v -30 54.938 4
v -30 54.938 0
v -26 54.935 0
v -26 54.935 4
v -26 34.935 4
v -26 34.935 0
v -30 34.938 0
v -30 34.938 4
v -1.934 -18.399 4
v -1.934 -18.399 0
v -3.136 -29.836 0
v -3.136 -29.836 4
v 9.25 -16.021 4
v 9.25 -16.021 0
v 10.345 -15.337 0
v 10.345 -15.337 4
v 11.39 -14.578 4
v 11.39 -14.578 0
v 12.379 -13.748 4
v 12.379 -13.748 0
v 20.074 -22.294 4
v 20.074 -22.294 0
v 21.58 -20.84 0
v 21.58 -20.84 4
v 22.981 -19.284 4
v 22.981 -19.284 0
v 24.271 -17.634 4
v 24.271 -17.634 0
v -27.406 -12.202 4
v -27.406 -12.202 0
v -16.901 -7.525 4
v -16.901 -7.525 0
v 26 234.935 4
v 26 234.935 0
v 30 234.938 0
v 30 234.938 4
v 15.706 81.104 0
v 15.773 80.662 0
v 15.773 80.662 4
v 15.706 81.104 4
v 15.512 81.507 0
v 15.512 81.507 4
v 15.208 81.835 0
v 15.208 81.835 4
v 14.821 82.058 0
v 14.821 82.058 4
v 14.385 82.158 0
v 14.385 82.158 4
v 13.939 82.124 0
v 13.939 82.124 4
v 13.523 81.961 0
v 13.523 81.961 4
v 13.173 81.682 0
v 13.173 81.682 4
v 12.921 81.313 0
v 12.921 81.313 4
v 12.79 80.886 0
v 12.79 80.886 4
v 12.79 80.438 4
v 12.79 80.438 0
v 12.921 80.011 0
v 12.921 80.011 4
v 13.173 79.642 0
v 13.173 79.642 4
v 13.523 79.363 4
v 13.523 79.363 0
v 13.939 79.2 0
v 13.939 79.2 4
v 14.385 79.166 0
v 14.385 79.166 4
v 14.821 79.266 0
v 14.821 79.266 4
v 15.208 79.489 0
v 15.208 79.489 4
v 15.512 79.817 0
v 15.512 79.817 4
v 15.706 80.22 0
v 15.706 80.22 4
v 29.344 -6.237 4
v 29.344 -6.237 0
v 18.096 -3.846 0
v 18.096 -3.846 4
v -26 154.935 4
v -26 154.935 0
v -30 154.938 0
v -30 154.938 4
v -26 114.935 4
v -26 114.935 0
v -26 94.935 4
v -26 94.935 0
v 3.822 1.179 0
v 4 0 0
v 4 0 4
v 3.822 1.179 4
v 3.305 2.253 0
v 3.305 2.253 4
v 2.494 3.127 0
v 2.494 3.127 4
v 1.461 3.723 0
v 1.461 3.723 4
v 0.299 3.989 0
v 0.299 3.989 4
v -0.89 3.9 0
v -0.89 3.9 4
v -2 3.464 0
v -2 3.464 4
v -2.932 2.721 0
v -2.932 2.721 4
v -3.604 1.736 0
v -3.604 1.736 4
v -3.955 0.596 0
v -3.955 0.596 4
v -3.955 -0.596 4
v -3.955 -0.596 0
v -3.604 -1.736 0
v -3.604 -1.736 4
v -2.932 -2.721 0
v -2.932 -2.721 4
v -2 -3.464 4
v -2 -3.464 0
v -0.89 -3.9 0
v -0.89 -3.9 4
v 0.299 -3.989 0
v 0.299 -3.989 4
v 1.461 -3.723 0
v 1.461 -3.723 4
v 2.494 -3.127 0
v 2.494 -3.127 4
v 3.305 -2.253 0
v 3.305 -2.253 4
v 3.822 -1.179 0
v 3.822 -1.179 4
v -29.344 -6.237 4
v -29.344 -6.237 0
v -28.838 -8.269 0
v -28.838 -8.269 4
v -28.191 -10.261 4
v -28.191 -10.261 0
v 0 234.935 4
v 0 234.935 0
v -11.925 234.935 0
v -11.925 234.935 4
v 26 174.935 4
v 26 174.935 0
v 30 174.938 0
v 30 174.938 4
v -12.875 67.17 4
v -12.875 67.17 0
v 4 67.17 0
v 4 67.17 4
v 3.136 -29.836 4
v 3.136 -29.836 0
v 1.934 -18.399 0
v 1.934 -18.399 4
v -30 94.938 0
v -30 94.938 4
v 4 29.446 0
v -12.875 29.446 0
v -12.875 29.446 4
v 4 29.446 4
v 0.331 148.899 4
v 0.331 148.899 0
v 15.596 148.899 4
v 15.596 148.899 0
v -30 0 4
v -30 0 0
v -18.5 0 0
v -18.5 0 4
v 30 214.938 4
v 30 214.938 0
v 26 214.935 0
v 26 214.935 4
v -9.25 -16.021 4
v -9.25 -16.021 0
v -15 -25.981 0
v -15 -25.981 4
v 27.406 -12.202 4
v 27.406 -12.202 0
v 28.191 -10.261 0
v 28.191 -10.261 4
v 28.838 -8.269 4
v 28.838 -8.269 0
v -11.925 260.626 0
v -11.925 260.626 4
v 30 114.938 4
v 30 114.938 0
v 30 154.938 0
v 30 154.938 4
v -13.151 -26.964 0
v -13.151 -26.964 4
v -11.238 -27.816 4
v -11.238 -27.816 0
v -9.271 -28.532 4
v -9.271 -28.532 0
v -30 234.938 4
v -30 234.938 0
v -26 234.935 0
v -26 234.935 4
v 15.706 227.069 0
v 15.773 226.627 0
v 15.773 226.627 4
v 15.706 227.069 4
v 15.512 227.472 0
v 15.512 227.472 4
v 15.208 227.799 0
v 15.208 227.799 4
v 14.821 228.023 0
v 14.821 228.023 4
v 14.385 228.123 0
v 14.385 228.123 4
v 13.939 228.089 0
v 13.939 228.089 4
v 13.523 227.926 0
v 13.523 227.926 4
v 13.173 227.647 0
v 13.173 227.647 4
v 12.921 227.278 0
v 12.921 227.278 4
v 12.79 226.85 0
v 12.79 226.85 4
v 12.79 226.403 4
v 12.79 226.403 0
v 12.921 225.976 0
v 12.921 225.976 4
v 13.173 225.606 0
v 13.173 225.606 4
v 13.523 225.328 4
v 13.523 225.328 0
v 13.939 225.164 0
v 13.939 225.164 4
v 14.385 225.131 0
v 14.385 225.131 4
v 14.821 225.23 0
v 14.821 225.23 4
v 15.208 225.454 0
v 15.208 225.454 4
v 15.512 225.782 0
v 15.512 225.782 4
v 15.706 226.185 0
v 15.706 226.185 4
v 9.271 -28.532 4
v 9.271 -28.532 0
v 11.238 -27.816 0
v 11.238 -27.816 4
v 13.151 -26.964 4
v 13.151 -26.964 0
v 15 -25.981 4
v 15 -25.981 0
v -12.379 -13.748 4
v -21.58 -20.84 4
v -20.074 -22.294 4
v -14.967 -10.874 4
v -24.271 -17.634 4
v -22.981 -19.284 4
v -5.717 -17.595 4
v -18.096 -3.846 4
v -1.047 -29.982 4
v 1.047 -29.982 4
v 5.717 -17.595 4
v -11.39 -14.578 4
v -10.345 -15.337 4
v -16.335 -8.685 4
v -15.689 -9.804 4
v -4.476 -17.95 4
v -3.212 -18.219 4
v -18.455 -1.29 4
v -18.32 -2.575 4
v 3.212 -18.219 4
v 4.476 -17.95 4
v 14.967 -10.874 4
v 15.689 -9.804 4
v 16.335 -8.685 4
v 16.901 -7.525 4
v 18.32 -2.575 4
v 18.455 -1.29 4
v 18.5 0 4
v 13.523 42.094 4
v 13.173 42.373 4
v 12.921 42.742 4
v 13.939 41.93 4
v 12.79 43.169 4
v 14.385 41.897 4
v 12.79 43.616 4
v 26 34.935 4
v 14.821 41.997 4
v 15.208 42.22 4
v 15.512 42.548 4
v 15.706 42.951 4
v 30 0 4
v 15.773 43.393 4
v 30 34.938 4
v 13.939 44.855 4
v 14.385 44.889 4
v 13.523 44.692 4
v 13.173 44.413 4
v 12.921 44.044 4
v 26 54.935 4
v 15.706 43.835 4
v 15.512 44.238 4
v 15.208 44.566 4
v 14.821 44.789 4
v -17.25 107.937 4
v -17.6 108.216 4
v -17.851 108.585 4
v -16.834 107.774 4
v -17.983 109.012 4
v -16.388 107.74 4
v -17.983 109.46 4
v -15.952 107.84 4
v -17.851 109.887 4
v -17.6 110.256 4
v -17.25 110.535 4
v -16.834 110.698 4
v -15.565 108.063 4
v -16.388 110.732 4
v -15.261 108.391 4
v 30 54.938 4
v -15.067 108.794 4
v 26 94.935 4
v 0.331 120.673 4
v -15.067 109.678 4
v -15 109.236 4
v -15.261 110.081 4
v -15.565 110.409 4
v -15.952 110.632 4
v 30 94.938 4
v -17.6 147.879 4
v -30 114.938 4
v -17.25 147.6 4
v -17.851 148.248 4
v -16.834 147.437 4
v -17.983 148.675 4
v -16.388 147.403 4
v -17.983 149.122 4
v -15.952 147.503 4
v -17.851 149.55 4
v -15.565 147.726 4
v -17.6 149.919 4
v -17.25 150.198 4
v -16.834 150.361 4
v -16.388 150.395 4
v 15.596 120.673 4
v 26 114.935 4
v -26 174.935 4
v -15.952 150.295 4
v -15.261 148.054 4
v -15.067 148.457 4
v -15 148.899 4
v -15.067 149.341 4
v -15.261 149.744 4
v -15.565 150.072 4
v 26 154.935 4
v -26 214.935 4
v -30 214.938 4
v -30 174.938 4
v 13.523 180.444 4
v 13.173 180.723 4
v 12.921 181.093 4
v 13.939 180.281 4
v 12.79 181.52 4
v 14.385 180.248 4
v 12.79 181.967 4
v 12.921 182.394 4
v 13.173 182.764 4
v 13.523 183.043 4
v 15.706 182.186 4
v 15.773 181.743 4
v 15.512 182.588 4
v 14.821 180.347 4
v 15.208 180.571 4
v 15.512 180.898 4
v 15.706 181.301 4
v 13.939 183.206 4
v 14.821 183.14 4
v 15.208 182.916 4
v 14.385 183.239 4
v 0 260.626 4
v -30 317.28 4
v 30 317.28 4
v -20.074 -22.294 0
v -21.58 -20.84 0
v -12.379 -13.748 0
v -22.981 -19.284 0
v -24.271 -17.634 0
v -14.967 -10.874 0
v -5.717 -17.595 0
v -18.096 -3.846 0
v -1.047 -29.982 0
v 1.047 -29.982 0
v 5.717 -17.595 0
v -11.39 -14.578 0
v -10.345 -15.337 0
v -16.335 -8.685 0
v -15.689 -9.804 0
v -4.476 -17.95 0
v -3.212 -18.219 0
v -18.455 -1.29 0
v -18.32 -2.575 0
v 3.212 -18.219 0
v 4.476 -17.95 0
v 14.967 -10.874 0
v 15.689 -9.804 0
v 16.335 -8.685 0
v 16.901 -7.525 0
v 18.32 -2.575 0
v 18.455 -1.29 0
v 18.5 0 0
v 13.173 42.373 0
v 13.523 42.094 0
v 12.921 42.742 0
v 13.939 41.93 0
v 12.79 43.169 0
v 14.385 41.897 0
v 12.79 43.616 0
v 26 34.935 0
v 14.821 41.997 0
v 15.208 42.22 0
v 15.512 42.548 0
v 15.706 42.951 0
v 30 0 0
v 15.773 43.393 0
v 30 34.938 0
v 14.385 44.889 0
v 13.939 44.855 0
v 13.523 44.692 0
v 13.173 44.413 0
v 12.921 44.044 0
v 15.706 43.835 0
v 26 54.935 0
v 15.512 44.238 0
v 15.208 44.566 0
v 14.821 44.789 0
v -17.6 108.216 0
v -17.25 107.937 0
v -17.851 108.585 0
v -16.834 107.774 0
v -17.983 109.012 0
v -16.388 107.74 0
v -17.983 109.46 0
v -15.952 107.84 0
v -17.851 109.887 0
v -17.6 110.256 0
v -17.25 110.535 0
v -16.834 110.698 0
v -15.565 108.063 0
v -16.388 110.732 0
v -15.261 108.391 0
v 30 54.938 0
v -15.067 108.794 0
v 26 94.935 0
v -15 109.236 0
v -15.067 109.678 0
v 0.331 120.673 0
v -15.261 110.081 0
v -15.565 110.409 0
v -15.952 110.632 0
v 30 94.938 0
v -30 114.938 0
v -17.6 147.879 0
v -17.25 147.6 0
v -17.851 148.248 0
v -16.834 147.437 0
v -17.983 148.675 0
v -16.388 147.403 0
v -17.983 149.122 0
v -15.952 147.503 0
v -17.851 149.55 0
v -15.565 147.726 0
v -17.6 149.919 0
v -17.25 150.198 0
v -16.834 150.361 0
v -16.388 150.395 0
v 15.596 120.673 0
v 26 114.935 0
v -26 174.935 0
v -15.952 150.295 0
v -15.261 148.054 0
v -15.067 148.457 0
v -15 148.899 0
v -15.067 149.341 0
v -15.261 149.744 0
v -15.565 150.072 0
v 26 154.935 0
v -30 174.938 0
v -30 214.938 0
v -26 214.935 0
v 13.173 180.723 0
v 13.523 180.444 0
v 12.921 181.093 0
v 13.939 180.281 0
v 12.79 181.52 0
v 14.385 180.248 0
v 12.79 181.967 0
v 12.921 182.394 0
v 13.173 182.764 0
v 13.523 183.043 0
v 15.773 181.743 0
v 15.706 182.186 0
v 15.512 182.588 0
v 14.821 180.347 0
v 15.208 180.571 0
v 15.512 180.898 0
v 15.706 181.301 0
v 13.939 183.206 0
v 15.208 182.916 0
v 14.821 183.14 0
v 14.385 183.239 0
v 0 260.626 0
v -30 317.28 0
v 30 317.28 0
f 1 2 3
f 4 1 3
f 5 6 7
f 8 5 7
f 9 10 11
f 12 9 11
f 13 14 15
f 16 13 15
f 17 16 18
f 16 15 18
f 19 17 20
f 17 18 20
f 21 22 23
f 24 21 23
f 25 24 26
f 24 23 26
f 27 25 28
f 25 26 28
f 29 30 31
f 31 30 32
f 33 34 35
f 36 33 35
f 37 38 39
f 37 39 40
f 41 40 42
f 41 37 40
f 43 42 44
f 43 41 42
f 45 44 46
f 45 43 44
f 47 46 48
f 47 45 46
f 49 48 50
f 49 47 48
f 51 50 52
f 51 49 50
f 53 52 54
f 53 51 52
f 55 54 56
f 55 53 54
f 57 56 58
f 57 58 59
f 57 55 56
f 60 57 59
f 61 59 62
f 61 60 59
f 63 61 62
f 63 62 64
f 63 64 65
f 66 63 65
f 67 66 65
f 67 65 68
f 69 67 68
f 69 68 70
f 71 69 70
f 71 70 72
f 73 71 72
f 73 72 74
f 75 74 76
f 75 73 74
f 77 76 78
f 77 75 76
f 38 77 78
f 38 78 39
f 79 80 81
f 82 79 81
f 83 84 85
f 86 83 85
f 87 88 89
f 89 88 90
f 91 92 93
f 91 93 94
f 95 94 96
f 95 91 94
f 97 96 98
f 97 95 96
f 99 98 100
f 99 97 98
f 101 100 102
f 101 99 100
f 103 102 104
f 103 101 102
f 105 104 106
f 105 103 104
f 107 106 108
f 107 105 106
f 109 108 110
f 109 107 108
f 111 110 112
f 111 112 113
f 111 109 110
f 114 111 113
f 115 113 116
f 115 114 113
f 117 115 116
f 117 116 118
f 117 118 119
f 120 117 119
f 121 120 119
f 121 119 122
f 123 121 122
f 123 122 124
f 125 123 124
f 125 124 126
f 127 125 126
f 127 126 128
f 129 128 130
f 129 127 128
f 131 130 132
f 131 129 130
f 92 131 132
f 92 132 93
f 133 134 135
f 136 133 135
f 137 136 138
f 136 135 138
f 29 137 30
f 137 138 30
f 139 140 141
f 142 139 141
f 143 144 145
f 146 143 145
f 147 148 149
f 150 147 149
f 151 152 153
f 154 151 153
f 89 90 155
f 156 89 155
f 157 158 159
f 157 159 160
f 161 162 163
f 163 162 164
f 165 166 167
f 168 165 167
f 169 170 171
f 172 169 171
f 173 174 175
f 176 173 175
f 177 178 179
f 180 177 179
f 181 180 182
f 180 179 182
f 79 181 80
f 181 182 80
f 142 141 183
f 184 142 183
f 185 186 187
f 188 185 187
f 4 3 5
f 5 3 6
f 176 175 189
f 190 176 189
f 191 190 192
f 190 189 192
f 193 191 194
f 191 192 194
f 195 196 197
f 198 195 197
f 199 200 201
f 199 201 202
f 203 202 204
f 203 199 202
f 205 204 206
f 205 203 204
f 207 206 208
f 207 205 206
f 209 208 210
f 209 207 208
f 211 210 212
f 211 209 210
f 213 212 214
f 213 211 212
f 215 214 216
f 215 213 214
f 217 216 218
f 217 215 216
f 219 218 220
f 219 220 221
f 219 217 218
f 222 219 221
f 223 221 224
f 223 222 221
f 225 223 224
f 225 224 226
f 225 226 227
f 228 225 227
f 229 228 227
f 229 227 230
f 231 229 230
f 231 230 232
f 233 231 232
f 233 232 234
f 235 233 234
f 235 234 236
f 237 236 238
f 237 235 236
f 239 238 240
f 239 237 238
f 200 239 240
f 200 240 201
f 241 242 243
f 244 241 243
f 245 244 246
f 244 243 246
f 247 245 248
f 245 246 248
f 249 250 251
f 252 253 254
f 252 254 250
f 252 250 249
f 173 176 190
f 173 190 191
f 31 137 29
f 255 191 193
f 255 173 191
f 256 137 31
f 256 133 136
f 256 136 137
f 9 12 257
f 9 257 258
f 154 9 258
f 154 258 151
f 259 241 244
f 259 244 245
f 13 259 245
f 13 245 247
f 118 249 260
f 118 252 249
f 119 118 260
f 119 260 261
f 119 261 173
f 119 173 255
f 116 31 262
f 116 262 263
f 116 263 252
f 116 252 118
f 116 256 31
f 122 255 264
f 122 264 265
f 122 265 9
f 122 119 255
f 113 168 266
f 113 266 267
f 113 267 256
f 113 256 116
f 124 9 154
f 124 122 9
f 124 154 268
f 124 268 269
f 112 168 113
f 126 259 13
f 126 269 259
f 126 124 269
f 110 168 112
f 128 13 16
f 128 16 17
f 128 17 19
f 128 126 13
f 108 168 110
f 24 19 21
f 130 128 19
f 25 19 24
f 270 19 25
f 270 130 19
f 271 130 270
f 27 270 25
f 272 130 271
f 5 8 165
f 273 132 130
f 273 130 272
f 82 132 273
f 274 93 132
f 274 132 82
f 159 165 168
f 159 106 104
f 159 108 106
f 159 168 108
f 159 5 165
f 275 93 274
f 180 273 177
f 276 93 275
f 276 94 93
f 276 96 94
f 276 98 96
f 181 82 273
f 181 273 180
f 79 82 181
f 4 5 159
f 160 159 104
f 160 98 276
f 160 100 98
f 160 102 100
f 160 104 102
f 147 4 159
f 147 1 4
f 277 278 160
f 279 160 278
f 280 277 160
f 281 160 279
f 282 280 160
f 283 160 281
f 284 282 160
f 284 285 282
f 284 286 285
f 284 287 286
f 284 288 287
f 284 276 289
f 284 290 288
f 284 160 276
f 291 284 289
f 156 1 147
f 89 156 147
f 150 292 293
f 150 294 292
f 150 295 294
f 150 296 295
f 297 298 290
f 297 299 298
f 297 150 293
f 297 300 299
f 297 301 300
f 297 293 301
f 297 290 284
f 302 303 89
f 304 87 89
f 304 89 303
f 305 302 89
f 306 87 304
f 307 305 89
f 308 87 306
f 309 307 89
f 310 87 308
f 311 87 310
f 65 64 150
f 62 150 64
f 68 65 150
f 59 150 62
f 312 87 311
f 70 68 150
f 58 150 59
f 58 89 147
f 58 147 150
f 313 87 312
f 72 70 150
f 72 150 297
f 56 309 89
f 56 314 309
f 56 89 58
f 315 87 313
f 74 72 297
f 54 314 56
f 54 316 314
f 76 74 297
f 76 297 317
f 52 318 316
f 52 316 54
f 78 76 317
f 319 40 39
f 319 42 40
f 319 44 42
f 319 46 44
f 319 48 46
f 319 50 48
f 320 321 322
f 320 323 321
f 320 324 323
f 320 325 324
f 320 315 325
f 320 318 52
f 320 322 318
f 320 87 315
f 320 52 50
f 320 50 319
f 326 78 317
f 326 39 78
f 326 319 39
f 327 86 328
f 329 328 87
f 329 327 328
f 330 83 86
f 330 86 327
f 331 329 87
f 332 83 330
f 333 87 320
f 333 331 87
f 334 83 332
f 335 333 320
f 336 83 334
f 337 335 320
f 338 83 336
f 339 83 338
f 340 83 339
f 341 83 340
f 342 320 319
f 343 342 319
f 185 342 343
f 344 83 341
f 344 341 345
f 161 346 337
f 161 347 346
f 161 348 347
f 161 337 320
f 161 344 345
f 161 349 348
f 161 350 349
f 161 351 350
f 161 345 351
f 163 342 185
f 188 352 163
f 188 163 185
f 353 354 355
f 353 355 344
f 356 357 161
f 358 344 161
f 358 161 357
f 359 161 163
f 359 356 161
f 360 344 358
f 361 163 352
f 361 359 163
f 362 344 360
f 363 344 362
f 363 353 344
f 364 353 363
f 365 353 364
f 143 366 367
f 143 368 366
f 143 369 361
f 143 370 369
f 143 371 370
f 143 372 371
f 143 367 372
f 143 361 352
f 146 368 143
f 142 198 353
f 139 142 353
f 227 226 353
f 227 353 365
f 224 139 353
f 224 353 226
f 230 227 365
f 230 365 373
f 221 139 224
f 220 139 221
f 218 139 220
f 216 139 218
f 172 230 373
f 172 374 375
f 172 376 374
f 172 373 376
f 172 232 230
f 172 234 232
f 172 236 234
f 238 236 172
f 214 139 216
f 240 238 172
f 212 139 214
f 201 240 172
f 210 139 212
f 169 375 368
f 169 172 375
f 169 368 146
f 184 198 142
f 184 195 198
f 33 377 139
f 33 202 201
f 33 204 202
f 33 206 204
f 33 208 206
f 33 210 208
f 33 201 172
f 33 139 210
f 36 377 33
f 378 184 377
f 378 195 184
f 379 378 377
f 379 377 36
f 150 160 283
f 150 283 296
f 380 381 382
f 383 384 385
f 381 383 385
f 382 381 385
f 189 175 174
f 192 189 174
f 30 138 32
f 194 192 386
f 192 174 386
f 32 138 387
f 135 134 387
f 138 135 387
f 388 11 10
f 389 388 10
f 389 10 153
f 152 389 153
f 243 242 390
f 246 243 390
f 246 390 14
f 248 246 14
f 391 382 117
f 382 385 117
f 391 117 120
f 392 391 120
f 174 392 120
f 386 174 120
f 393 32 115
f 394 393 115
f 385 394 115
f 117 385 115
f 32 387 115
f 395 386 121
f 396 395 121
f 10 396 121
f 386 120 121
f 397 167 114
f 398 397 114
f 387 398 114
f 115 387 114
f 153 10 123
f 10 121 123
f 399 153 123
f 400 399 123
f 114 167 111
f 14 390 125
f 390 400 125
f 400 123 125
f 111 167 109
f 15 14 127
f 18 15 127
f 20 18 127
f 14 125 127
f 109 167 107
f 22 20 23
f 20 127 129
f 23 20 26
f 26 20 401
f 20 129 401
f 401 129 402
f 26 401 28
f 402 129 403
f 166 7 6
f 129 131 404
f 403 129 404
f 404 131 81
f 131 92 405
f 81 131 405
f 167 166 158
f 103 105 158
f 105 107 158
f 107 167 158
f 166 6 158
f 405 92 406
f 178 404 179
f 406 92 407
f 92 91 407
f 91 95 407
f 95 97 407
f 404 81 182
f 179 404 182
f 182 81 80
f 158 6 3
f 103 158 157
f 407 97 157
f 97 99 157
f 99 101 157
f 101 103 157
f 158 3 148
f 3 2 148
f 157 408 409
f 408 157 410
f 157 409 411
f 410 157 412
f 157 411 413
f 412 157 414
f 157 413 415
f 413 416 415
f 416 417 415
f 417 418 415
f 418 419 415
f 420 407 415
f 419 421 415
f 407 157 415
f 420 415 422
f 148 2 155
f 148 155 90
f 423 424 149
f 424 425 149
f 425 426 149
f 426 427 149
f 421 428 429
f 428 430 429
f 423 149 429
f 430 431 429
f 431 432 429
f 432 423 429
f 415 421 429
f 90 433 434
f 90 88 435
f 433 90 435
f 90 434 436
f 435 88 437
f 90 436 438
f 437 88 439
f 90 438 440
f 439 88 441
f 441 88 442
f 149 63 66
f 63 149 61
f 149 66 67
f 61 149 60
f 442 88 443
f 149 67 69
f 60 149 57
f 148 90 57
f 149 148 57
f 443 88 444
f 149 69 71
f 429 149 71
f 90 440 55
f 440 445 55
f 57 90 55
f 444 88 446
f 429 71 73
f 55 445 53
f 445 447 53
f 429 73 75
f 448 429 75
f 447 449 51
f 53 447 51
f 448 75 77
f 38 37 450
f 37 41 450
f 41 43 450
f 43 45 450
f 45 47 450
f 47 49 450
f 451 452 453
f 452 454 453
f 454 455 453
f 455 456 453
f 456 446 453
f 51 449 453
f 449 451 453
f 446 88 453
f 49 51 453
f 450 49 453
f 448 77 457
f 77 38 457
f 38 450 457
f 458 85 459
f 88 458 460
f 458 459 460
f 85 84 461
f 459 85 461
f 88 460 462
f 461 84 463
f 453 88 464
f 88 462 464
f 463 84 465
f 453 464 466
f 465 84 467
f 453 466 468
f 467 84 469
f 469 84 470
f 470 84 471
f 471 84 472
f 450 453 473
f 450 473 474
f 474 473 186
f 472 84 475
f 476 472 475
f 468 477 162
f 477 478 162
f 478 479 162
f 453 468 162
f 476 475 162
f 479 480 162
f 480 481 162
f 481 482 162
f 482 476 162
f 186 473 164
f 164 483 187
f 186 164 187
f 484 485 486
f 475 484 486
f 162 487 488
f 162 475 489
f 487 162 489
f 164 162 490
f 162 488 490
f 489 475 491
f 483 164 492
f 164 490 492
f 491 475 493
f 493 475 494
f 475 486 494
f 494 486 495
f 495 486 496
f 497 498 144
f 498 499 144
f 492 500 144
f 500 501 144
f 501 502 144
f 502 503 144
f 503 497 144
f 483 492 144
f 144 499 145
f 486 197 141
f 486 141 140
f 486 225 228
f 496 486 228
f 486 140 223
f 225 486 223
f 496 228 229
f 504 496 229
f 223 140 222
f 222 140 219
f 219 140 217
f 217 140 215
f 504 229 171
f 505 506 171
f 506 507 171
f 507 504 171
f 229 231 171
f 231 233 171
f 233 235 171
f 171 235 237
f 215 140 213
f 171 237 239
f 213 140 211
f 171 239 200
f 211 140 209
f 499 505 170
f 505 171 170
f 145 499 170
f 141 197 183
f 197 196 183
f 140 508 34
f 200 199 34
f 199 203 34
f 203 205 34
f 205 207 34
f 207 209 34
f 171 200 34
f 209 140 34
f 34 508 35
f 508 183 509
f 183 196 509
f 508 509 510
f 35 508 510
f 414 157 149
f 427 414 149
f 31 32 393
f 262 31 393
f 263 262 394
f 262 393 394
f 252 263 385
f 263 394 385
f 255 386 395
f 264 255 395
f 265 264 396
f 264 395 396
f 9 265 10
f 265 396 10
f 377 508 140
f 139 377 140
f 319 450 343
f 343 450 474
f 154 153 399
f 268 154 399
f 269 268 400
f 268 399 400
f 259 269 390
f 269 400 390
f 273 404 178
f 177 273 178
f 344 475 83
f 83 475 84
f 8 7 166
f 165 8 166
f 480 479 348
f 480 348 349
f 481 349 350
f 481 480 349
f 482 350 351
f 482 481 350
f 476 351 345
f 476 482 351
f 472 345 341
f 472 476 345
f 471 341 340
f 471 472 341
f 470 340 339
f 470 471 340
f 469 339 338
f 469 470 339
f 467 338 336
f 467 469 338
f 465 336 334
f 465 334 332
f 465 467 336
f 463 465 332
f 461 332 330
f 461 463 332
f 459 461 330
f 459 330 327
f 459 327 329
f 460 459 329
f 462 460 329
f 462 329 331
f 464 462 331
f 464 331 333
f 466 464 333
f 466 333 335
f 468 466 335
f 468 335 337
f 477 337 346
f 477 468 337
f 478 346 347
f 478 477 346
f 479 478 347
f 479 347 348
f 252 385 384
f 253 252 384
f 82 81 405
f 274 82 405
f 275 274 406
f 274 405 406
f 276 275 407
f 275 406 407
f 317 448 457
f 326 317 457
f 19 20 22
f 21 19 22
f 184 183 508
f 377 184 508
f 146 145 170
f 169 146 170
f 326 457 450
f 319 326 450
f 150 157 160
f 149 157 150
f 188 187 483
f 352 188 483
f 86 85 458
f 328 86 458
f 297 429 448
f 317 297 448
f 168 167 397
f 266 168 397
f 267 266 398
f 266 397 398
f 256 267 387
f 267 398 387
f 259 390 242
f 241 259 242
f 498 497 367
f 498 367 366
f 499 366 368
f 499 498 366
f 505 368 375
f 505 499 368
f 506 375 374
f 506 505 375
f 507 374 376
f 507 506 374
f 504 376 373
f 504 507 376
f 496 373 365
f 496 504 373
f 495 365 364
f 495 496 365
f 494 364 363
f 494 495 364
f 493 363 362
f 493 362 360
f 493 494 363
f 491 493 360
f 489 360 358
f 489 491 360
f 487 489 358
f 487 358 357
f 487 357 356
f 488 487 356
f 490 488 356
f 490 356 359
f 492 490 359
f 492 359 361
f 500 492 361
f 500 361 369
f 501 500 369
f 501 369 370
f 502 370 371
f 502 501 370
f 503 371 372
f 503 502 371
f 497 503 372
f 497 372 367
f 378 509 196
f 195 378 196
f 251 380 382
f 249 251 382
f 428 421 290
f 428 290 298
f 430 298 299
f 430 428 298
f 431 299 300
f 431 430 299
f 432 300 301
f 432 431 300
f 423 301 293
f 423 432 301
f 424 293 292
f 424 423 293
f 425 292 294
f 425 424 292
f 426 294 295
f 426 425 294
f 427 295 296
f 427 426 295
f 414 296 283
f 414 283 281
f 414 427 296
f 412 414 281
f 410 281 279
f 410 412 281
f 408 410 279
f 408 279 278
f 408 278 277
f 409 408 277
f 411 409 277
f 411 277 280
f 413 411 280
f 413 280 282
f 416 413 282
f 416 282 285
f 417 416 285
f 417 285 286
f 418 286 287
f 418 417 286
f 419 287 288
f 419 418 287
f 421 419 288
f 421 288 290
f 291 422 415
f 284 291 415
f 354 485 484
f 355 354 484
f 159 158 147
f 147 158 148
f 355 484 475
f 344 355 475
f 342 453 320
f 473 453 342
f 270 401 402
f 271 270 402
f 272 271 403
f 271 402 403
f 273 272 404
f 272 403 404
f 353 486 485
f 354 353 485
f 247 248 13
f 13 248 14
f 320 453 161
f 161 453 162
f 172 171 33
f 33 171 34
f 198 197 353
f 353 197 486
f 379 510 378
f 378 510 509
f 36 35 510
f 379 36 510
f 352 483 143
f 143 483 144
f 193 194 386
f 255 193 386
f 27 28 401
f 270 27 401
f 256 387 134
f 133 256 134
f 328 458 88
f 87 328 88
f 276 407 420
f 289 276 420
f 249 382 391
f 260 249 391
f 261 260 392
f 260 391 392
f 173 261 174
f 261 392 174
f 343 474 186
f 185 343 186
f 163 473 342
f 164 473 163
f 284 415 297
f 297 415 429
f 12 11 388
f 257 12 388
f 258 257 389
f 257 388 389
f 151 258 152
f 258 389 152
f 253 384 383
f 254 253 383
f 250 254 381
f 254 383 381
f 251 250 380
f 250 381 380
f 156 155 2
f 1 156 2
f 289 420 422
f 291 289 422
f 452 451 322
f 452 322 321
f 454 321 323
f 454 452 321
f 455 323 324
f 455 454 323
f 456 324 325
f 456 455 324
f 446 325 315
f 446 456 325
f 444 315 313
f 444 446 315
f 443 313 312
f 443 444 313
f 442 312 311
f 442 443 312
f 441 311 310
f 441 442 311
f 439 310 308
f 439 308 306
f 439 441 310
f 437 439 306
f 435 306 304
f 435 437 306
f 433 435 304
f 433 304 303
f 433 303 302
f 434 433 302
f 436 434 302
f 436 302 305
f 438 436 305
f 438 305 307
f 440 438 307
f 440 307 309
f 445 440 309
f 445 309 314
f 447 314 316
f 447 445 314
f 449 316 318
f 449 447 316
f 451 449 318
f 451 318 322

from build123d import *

# Parameters (mm, degrees)
SKETCH1_R           = 1.5
SKETCH1_R_2         = 4.000000004
SKETCH1_W           = 15.264959334
SKETCH1_H           = 28.225795916
SKETCH1_W_2         = 16.875415015
SKETCH1_H_2         = 37.724658957
BOSS_EXTRUDE1_DEPTH = 4


with BuildPart() as part:
    # Sketch1 → Boss-Extrude1 (new body)
    with BuildSketch(Plane.XY):
        with BuildLine():
            Line((-30.000000002, 34.937585276), (-30.000000002, -5e-09))
            Line((-30.000000002, -5e-09), (-18.500000007, -5e-09))
            ThreePointArc((-18.500000007, -5e-09), (-18.398655071, -1.933776576), (-18.09573062, -3.846366286))
            Line((-18.09573062, -3.846366286), (-29.344428024, -6.23735073))
            ThreePointArc((-29.344428024, -6.23735073), (-28.53169549, -9.270509837), (-27.406363731, -12.202099298))
            Line((-27.406363731, -12.202099298), (-16.900590972, -7.524627904))
            ThreePointArc((-16.900590972, -7.524627904), (-16.021469975, -9.250000008), (-14.966814401, -10.874027176))
            Line((-14.966814401, -10.874027176), (-24.270509832, -17.633557574))
            ThreePointArc((-24.270509832, -17.633557574), (-22.294344765, -20.073918196), (-20.073918191, -22.294344769))
            Line((-20.073918191, -22.294344769), (-12.378916221, -13.74817928))
            ThreePointArc((-12.378916221, -13.74817928), (-10.87402717, -14.966814404), (-9.250000002, -16.021469978))
            Line((-9.250000002, -16.021469978), (-14.999999999, -25.980762117))
            ThreePointArc((-14.999999999, -25.980762117), (-12.202099292, -27.406363733), (-9.27050983, -28.531695491))
            Line((-9.27050983, -28.531695491), (-5.716814397, -17.594545559))
            ThreePointArc((-5.716814397, -17.594545559), (-3.846366281, -18.09573062), (-1.933776571, -18.39865507))
            Line((-1.933776571, -18.39865507), (-3.135853898, -29.835656862))
            ThreePointArc((-3.135853898, -29.835656862), (0, -30.000000001), (3.135853897, -29.835656861))
            Line((3.135853897, -29.835656861), (1.93377657, -18.398655069))
            ThreePointArc((1.93377657, -18.398655069), (3.84636628, -18.095730618), (5.716814395, -17.594545555))
            Line((5.716814395, -17.594545555), (9.270509829, -28.531695488))
            ThreePointArc((9.270509829, -28.531695488), (12.202099289, -27.406363728), (14.999999996, -25.980762112))
            Line((14.999999996, -25.980762112), (9.249999999, -16.021469973))
            ThreePointArc((9.249999999, -16.021469973), (10.874027165, -14.966814398), (12.378916215, -13.748179274))
            Line((12.378916215, -13.748179274), (20.073918185, -22.294344763))
            ThreePointArc((20.073918185, -22.294344763), (22.294344757, -20.07391819), (24.270509823, -17.633557568))
            Line((24.270509823, -17.633557568), (14.966814392, -10.87402717))
            ThreePointArc((14.966814392, -10.87402717), (16.021469966, -9.250000002), (16.900590962, -7.5246279))
            Line((16.900590962, -7.5246279), (27.40636372, -12.202099293))
            ThreePointArc((27.40636372, -12.202099293), (28.531695479, -9.270509833), (29.344428012, -6.237350727))
            Line((29.344428012, -6.237350727), (18.095730608, -3.846366284))
            ThreePointArc((18.095730608, -3.846366284), (18.398655059, -1.933776575), (18.499999994, -5e-09))
            Line((18.499999994, -5e-09), (29.999999989, -5e-09))
            Line((29.999999989, -5e-09), (29.999999989, 34.937585276))
            Line((29.999999989, 34.937585276), (25.999999989, 34.935484549))
            Line((25.999999989, 34.935484549), (25.999999989, 54.935484549))
            Line((25.999999989, 54.935484549), (29.999999989, 54.937585276))
            Line((29.999999989, 54.937585276), (29.999999989, 94.937585276))
            Line((29.999999989, 94.937585276), (25.999999989, 94.935484549))
            Line((25.999999989, 94.935484549), (25.999999989, 114.935484549))
            Line((25.999999989, 114.935484549), (29.999999989, 114.937585276))
            Line((29.999999989, 114.937585276), (29.999999989, 154.937585276))
            Line((29.999999989, 154.937585276), (25.999999989, 154.935484549))
            Line((25.999999989, 154.935484549), (25.999999989, 174.935484549))
            Line((25.999999989, 174.935484549), (29.999999989, 174.937585276))
            Line((29.999999989, 174.937585276), (29.999999989, 214.937585276))
            Line((29.999999989, 214.937585276), (25.999999989, 214.935484549))
            Line((25.999999989, 214.935484549), (25.999999989, 234.935484549))
            Line((25.999999989, 234.935484549), (29.999999989, 234.937585276))
            Line((29.999999989, 234.937585276), (29.999999989, 317.280454814))
            Line((29.999999989, 317.280454814), (-30.000000002, 317.280454814))
            Line((-30.000000002, 317.280454814), (-30.000000002, 234.937585276))
            Line((-30.000000002, 234.937585276), (-26.000000002, 234.935484549))
            Line((-26.000000002, 234.935484549), (-26.000000002, 214.935484549))
            Line((-26.000000002, 214.935484549), (-30.000000002, 214.937585276))
            Line((-30.000000002, 214.937585276), (-30.000000002, 174.937585276))
            Line((-30.000000002, 174.937585276), (-26.000000002, 174.935484549))
            Line((-26.000000002, 174.935484549), (-26.000000002, 154.935484549))
            Line((-26.000000002, 154.935484549), (-30.000000002, 154.937585276))
            Line((-30.000000002, 154.937585276), (-30.000000002, 114.937585276))
            Line((-30.000000002, 114.937585276), (-26.000000002, 114.935484549))
            Line((-26.000000002, 114.935484549), (-26.000000002, 94.935484549))
            Line((-26.000000002, 94.935484549), (-30.000000002, 94.937585276))
            Line((-30.000000002, 94.937585276), (-30.000000002, 54.937585276))
            Line((-30.000000002, 54.937585276), (-26.000000002, 54.935484549))
            Line((-26.000000002, 54.935484549), (-26.000000002, 34.935484549))
            Line((-26.000000002, 34.935484549), (-30.000000002, 34.937585276))
        make_face()
        with Locations((14.272904266, 226.626719069)):
            Circle(SKETCH1_R, mode=Mode.SUBTRACT)
        with Locations((-6e-09, -5e-09)):
            Circle(SKETCH1_R_2, mode=Mode.SUBTRACT)
        with Locations((14.272904266, 181.743471482)):
            Circle(SKETCH1_R, mode=Mode.SUBTRACT)
        with Locations((-16.500000002, 148.89892656)):
            Circle(SKETCH1_R, mode=Mode.SUBTRACT)
        with Locations((-16.500000002, 109.235963146)):
            Circle(SKETCH1_R, mode=Mode.SUBTRACT)
        with Locations((14.272904266, 80.661965148)):
            Circle(SKETCH1_R, mode=Mode.SUBTRACT)
        with Locations((14.272904266, 43.392817658)):
            Circle(SKETCH1_R, mode=Mode.SUBTRACT)
        Polygon((-11.924742875, 260.626143035), (0, 260.626143035), (-2e-09, 234.935484549), (-11.924742875, 234.935484549), align=None, mode=Mode.SUBTRACT)
        with Locations((7.963115832, 134.786028602)):
            Rectangle(SKETCH1_W, SKETCH1_H, mode=Mode.SUBTRACT)
        with Locations((-4.43770751, 48.307901023)):
            Rectangle(SKETCH1_W_2, SKETCH1_H_2, mode=Mode.SUBTRACT)
    extrude(amount=BOSS_EXTRUDE1_DEPTH)


solid = part.part
